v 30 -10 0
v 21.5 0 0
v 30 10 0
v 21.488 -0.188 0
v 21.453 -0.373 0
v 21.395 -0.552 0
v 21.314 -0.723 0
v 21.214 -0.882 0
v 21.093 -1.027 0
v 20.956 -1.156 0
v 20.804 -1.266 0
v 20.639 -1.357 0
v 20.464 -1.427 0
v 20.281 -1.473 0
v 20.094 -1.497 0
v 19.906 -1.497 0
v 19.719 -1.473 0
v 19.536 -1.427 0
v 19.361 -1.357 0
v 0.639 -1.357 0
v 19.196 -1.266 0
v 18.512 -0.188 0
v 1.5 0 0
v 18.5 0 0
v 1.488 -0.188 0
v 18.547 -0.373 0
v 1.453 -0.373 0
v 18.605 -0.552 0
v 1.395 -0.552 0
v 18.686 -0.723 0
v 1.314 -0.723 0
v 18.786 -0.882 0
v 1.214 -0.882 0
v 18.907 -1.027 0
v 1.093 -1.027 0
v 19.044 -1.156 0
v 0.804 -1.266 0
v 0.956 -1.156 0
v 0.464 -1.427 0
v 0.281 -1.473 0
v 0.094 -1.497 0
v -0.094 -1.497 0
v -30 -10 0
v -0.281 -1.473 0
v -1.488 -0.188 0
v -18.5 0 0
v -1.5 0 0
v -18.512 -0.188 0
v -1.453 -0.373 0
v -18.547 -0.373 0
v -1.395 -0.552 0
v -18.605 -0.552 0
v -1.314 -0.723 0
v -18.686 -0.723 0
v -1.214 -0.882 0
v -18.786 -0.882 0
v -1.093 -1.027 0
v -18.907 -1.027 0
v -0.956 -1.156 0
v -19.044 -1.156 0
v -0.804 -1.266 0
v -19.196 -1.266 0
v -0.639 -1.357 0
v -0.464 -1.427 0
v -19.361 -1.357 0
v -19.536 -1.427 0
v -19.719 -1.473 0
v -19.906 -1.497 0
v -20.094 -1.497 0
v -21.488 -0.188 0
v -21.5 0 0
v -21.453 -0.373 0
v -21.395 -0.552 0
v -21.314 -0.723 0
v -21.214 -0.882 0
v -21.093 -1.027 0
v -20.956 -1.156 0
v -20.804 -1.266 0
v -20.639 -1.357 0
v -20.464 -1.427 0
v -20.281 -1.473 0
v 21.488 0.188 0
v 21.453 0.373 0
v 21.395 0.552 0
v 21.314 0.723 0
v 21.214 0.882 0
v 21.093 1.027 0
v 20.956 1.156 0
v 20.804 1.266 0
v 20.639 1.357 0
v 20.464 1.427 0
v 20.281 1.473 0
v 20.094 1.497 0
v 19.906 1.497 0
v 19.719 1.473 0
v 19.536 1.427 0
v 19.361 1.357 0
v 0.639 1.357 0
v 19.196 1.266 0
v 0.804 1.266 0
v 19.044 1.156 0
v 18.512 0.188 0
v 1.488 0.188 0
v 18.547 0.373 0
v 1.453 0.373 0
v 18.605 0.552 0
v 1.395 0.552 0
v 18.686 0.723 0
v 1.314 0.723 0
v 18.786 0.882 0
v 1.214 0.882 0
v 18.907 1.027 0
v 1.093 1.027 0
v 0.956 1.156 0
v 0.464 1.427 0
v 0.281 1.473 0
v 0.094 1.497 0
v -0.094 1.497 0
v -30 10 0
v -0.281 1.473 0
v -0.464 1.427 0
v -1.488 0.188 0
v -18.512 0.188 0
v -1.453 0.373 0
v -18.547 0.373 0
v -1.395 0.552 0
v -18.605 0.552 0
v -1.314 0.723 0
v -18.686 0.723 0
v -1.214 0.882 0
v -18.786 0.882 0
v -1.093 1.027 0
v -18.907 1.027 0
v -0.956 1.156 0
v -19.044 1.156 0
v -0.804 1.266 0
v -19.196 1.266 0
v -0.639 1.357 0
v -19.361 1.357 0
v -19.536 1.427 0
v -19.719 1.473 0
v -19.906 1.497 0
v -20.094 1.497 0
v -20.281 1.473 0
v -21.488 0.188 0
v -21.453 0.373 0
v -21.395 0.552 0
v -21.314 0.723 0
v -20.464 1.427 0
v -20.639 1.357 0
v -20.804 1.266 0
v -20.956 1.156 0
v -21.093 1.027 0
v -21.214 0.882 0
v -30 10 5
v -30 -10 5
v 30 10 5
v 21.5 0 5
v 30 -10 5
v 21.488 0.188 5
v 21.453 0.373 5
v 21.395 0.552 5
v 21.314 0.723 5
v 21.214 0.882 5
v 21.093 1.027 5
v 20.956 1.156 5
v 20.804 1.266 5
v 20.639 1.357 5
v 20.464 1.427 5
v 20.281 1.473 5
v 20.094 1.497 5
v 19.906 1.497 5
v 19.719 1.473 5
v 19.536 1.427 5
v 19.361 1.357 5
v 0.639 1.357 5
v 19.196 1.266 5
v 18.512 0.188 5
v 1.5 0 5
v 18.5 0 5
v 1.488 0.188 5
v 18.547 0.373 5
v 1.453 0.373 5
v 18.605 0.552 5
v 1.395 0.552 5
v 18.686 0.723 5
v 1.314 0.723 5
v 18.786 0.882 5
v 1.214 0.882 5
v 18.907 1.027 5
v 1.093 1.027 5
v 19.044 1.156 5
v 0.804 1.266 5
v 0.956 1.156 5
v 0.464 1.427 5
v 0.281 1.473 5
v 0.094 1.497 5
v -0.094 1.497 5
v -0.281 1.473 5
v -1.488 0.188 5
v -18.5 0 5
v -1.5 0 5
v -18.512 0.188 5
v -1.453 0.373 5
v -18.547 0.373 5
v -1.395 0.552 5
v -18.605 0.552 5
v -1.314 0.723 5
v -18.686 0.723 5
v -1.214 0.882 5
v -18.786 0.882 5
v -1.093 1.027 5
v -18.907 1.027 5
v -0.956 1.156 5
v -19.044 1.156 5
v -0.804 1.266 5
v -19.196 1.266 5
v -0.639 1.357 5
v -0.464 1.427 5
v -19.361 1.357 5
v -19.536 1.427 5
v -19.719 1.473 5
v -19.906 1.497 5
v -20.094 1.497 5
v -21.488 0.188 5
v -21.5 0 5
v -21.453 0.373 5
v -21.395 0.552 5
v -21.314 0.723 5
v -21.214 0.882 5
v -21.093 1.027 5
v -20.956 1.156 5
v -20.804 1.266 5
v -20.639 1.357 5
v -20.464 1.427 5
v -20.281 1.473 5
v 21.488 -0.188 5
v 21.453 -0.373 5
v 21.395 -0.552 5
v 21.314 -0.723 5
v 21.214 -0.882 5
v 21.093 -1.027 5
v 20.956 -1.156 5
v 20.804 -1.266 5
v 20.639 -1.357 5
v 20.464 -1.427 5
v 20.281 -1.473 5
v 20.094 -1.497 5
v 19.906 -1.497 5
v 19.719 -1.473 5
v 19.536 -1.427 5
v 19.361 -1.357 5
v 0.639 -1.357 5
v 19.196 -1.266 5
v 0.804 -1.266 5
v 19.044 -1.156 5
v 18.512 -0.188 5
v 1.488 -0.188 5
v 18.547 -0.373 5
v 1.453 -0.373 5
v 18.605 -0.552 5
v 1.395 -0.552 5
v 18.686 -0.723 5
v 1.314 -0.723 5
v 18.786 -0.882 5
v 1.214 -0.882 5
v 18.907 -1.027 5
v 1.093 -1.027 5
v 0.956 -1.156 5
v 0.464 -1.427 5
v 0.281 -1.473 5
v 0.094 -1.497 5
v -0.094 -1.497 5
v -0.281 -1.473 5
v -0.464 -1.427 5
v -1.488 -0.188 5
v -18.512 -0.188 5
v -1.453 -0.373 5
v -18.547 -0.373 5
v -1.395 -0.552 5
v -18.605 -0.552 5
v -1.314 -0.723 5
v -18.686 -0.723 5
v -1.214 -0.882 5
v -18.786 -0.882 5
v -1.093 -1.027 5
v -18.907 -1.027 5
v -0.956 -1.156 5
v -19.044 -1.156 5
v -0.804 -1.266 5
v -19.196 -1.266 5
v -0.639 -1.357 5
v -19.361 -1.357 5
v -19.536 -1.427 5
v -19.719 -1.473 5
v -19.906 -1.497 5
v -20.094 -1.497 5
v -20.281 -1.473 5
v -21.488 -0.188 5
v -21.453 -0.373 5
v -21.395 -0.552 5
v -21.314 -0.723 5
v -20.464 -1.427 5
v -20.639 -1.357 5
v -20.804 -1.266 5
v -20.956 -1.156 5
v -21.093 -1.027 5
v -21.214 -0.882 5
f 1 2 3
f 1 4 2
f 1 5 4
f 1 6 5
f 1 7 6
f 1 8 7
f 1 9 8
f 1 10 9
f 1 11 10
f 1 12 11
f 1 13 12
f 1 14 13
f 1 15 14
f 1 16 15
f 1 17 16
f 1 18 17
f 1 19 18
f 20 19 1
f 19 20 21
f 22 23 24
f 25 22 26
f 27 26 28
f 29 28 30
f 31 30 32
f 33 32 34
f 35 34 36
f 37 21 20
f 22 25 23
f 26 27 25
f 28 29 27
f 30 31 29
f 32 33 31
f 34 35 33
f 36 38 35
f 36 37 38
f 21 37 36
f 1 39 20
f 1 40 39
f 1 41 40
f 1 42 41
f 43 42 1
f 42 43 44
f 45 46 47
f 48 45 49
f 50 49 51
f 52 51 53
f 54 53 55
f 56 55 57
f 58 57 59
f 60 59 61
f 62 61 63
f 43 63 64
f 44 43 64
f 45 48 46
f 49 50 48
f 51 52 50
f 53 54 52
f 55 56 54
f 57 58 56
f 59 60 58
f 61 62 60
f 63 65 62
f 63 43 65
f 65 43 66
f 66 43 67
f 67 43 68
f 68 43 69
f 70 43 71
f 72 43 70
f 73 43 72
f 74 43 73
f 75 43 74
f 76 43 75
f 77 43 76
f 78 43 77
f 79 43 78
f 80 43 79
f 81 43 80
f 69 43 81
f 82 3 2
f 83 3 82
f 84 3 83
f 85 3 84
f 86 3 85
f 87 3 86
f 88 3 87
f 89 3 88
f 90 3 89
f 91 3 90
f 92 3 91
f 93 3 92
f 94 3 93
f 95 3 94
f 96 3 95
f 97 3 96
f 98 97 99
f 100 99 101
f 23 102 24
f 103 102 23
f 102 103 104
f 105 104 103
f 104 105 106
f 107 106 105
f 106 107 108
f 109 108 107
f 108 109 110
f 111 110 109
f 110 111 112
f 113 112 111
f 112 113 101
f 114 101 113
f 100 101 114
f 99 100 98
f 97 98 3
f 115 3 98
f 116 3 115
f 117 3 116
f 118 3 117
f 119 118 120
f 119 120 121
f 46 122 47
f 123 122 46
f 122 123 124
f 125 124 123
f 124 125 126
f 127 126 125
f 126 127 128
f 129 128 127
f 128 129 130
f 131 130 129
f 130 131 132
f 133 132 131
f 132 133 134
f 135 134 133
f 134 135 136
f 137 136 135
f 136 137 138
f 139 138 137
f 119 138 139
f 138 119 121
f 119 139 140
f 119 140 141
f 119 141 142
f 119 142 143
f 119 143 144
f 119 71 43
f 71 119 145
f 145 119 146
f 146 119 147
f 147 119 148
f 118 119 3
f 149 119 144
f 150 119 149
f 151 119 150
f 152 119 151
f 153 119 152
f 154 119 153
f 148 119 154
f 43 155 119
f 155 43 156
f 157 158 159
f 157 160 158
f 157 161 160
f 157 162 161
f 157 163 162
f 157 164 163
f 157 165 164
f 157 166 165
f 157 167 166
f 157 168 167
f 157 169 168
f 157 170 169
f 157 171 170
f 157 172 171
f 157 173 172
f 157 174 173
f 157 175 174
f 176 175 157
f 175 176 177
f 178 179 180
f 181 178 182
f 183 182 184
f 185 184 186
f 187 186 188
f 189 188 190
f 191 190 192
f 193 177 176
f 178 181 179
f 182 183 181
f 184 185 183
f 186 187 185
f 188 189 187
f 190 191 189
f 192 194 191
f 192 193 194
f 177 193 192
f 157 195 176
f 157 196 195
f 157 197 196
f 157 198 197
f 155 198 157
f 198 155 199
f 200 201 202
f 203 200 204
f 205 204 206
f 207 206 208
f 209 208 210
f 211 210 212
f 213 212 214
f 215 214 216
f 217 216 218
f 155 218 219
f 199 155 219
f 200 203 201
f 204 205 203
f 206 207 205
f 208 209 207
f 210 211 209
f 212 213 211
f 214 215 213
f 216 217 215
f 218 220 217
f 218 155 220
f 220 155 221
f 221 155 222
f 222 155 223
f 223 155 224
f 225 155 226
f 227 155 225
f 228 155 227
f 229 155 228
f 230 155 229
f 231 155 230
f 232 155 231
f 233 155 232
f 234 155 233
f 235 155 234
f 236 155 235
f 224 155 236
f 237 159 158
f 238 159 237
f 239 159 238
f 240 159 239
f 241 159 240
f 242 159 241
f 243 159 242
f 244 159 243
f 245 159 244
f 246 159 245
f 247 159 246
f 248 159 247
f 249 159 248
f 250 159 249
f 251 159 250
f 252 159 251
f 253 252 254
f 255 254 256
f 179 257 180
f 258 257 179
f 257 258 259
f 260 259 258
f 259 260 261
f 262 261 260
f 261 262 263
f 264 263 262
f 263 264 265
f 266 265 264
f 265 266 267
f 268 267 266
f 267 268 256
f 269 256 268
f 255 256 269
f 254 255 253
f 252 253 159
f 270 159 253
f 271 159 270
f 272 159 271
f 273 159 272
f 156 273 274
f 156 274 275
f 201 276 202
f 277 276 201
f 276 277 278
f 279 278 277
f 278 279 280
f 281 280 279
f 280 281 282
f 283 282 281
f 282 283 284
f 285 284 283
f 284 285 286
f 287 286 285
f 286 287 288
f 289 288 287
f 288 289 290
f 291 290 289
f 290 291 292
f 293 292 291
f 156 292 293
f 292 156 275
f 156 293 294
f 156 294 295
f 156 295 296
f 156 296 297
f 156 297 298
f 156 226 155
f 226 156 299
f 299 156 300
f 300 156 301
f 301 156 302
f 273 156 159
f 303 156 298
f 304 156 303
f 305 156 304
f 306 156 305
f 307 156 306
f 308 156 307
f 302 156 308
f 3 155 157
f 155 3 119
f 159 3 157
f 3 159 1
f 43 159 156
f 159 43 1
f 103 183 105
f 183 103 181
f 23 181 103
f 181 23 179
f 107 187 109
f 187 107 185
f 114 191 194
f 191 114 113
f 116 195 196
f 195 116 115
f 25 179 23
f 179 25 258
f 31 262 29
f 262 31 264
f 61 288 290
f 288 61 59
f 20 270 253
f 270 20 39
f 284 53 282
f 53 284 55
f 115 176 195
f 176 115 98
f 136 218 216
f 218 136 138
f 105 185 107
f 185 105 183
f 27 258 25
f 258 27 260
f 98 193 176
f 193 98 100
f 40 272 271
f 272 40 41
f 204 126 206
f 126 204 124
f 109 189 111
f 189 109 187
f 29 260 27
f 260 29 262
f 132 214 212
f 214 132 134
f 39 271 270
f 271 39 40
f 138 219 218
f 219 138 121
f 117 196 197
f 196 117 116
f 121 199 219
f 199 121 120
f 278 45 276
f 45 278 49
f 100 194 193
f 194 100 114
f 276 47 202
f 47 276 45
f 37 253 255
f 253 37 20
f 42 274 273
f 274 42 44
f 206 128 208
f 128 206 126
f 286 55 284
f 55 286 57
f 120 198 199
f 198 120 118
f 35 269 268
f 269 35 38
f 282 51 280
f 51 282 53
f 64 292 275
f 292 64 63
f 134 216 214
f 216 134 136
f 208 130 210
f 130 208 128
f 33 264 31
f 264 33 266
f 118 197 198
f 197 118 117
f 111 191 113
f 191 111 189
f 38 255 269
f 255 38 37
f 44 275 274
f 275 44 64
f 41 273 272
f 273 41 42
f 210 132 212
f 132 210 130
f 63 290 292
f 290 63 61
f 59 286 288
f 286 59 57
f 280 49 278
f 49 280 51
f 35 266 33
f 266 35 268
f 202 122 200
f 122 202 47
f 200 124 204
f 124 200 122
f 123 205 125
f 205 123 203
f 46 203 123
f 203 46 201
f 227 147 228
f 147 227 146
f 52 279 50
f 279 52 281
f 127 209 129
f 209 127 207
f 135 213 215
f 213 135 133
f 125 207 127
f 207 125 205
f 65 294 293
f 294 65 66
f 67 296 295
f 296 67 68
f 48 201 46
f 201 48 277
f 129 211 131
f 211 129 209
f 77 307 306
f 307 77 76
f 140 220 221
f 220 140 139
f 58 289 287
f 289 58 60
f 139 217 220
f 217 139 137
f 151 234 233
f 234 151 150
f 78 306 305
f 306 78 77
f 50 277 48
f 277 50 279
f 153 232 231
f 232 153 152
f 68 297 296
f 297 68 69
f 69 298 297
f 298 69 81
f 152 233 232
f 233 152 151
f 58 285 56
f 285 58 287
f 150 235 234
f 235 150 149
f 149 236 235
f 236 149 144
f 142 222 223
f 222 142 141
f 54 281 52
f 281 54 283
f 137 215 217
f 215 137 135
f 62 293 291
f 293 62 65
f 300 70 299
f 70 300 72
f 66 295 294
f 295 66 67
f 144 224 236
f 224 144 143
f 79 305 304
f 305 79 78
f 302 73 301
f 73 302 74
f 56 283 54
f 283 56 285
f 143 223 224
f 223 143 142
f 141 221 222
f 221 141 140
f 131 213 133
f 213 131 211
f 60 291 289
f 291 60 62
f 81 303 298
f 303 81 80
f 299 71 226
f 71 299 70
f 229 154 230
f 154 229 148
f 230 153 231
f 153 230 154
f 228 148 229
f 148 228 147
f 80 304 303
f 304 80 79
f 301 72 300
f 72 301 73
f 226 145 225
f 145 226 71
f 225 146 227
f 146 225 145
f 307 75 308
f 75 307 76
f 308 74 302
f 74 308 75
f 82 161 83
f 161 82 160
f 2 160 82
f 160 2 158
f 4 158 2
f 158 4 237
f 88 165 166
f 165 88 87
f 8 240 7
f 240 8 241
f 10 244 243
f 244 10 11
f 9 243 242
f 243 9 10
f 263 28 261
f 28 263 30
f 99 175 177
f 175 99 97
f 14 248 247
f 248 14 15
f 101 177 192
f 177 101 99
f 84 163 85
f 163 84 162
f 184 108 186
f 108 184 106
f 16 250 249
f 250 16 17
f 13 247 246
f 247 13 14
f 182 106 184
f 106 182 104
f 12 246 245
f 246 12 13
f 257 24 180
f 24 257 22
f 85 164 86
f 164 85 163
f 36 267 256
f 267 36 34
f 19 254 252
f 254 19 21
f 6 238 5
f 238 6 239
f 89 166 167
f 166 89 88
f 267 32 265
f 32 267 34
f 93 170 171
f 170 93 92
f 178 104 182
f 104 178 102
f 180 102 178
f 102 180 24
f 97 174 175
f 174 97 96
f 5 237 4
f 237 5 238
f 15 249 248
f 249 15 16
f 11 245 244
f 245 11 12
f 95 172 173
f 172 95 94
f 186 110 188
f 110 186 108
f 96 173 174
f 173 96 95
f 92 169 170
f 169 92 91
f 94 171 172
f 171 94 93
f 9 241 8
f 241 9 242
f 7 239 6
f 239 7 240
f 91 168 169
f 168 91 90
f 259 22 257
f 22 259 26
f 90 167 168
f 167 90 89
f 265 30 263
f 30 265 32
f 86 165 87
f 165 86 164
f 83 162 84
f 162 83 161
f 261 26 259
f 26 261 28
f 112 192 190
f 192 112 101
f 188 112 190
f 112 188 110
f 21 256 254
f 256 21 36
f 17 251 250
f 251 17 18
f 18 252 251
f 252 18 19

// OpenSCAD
// file: ../lib/utils.scad
include <params.scad>;

function tol(val) = val - tolerance;

module cone(r, angle, invert=false) {
    h = tan((180 - angle) / 2) * r;
    translate([0, 0, -h]) {
        if (invert) {
                cylinder(r1=r,r2=0,h=h, $fn=20); 
        } else {
            cylinder(r1=0,r2=r,h=h, $fn=20); 
        }
    }
}

module roundrect(vect, r, $fn=20) {
    sq = len(vect) > 1
        ? [for (i = [0:1:len(vect)-1]) vect[i] - r * 2]
        : vect - r * 2;
    minkowski() {
        square(sq);
        translate([r, r])
            circle(r=r);
    }
}

module profile($fn=20) {
    minkowski() {
        translate([fan_case_radius, fan_case_radius, 0])
            square(fan_case - fan_case_radius * 2);
        circle(fan_case_radius, $fn);
    }
}

module fan_mount_points(radius, $fn=20) {
    offset = (fan_case - fan_screw_distance) / 2;
    translate([offset, offset, 0]) {
        circle(radius, $fn);
        translate([fan_screw_distance, 0, 0])
            circle(radius, $fn);
        translate([fan_screw_distance, fan_screw_distance, 0])
            circle(radius, $fn);
        translate([0, fan_screw_distance, 0])
            circle(radius, $fn);
    }
}

module square_grill(width, height, fin_width, fin_count) {
    fin_spacing = width / fin_count;
    difference() {
        square(width);
        union() {
            for (i = [0:1:fin_count]) {
                translate([(i + 1) * fin_spacing - (fin_spacing / 2) - (fin_width / 2), 0, 0])
                    square([fin_width, height]);
            }
        }
    }
}

module bushing(outer_r, inner_r, h) {
    linear_extrude(h)
        difference() {
            circle(r=outer_r);
            circle(r=inner_r);
        }
}

module screw_at_origin(r, d, l, head, head_d, cap, angle) {
    translate([0, 0, -l])
        screw(r, d, l, head, head_d, cap, angle);
}

module screw(r, d, l, head, head_d, cap, angle, fn=20, head_fn) {
    radius = r > 0 ? r : d / 2;
    head_r = head > 0 ? head : head_d / 2;
    hfn = head_fn ? head_fn : fn;

    union() {
        if (angle) {
            translate([0, 0, l])
                cone(head_r, angle, false);
        }
        linear_extrude(l)
            circle(r=radius, $fn=fn);
        if (cap > 0) {
            translate([0, 0, l - cap])
                linear_extrude(cap)
                    circle(r=head_r, $fn=hfn);
        }
    }
}

module inset_screw(r, d, l, head, head_d, cap, angle, inset, fn=20, head_fn) {
    screw_height = l - inset;
    head_r = head > 0 ? head : head_d / 2;

    union() {
        screw(
            r=r,
            d=d,
            l=screw_height,
            head=head_r,
            cap=cap,
            angle=angle,
            fn=fn,
            head_fn=head_fn
        );
        translate([0, 0, screw_height])
            linear_extrude(inset)
                circle(r=head_r, $fn=fn);
    }
}

function inch_to_mm(inches) = inches * 25.4;
// file: ../lib/params.scad
fan_case = 120;
fan_screw_distance = 105;
fan_case_depth = 25;
fan_case_radius = 5;
fan_case_screw_radius = 2.5;
fan_case_socket_cap_radius = 5.6 / 2;
fan_case_screw_head_radius = 3;
fan_case_screw_head_angle = 90;

grill_screw_size = 3;
grill_screw_radius = grill_screw_size / 2;
grill_screw_inset = 2;
grill_radius = 114 / 2;
grill_fin_offset = 10;
grill_fin_thickness = 2;
grill_fin_degrees = 30;

rear_grill_thickness = 2;

front_grill_thickness = 2;
front_grill_fin_count = 6;
front_grill_fin_thickness = 2;

filter_thickness = 5;
filter_width = fan_screw_distance - fan_case_screw_radius * 3;
filter_offset = (fan_case - filter_width) / 2;

base_retainer_thickness = 2;
base_height = 30;
base_cut_offset = 10;
base_retainer_inset = 4;

adapter_thickness = 2;
adapter_duct_in = 4;
adapter_height = 14;
adapter_duct_height = 50;
flat_adapter_duct_height = 50;
flat_adapter_screw_radius = 2;
flat_adapter_screw_head_radius = 4;

caddy_thickness = 2;
caddy_handle_width = 20;
caddy_handle_depth = 10;
caddy_handle_grip_count = 5;
caddy_handle_grip_depth = 1;
caddy_handle_grip_width = 1;
caddy_clip_height = 2;
caddy_clip_depth = 6;
caddy_clip_offset = 1;

foot_lower_radius = 15;
foot_upper_radius = 20;
foot_height = 18;
foot_inset_radius = 4;
foot_inset_depth = 3;
foot_screw_radius = 4;
foot_screw_inset = 6;
foot_screw_head_radius = 8;

power_supply_case_thickness = 3.0;
power_supply_screw_radius = 1.5;
power_supply_bushing_radius = 7.5;

power_supply_cable_pass_width = 18;
power_supply_cable_pass_height = 5;
power_supply_cable_pass_overhang = 5;
power_supply_cable_pass_overhang_depth = power_supply_case_thickness;
power_supply_cable_pass_depth = 3;
power_supply_cable_pass_thickness = 3;

tolerance = 0.2;
// main file
include <../lib/params.scad>;
use <../lib/utils.scad>;

$fn=50;

through_base_width = 60;
through_base_height = 20;
through_base_depth = 5;
through_base_screw_offset = 10;
through_base_screw_radius = 1.5;
through_base_screw_head = 2.8;
through_base_screw_inset = 3;
case_thickness = 1;
case_through_radius = 6;

inlet_length = 10;
inlet_outer_radius = 3;
inlet_inner_radius = 2;

through_base = "drill_guide";

module through_profile() {
    linear_extrude(through_base_depth)
        square([through_base_width, through_base_height], center=true);
}

module inlet_profile() {
    translate([0, 1])
        intersection() {
            union() {
                square([inlet_outer_radius, inlet_length]);
                translate([3, 10])
                    circle(r=3);
                translate([2, 0])
                    circle(r=2);
            }
            translate([0, -1])
                square([3, 15]);
        }
}

module inlet() {
    difference() {
        rotate_extrude(r=360)
            translate([1, 0])
                rotate([0, 0, -20])
                    inlet_profile();
        translate([0, 0, -2])
            cylinder(d=10, h=2);
    }
}

module left_screw_translate() {
    translate([-through_base_width/2+through_base_screw_offset, 0, 0])
        children();
}

module right_screw_translate() {
    translate([through_base_width/2-through_base_screw_offset, 0, 0])
        children();
}

module inner() {
    union() {
        difference() {
            through_profile();
            left_screw_translate()
                screw(r=1.5, l=through_base_depth, head=2.8, cap=3);
            right_screw_translate()
                screw(r=1.5, l=through_base_depth, head=2.8, cap=3);
            // inlet cutout
            cylinder(d=8, h=through_base_depth);
        }
        inlet();
    }
}

module outer() {
    union() {
        difference() {
            union() {
                through_profile();
                translate([0, 0, -case_thickness])
                    cylinder(r=case_through_radius,h=through_base_depth+case_thickness);
            }
            left_screw_translate()
                screw(r=1.5, l=through_base_depth, head=3.25, cap=3, head_fn=6);
            right_screw_translate()
                screw(r=1.5, l=through_base_depth, head=3.25, cap=3, head_fn=6);
            translate([0, 0, -case_thickness])
                cylinder(d=5, h=through_base_depth + case_thickness);
        }
    }
}

module drill_guide() {
    difference() {
        through_profile();
        cylinder(r=1.5, h=through_base_depth);
        left_screw_translate()
            cylinder(r=1.5, h=through_base_depth);
        right_screw_translate()
            cylinder(r=1.5, h=through_base_depth);
    }
}

if (through_base == "inner") {
    inner();
} else if (through_base == "outer") {
    outer();
} else if (through_base == "drill_guide") {
    drill_guide();
} else if (through_base == "both") {
    inner();
    translate([0, 0, -case_thickness])
        rotate([0, 180, 0])
            outer();
}
